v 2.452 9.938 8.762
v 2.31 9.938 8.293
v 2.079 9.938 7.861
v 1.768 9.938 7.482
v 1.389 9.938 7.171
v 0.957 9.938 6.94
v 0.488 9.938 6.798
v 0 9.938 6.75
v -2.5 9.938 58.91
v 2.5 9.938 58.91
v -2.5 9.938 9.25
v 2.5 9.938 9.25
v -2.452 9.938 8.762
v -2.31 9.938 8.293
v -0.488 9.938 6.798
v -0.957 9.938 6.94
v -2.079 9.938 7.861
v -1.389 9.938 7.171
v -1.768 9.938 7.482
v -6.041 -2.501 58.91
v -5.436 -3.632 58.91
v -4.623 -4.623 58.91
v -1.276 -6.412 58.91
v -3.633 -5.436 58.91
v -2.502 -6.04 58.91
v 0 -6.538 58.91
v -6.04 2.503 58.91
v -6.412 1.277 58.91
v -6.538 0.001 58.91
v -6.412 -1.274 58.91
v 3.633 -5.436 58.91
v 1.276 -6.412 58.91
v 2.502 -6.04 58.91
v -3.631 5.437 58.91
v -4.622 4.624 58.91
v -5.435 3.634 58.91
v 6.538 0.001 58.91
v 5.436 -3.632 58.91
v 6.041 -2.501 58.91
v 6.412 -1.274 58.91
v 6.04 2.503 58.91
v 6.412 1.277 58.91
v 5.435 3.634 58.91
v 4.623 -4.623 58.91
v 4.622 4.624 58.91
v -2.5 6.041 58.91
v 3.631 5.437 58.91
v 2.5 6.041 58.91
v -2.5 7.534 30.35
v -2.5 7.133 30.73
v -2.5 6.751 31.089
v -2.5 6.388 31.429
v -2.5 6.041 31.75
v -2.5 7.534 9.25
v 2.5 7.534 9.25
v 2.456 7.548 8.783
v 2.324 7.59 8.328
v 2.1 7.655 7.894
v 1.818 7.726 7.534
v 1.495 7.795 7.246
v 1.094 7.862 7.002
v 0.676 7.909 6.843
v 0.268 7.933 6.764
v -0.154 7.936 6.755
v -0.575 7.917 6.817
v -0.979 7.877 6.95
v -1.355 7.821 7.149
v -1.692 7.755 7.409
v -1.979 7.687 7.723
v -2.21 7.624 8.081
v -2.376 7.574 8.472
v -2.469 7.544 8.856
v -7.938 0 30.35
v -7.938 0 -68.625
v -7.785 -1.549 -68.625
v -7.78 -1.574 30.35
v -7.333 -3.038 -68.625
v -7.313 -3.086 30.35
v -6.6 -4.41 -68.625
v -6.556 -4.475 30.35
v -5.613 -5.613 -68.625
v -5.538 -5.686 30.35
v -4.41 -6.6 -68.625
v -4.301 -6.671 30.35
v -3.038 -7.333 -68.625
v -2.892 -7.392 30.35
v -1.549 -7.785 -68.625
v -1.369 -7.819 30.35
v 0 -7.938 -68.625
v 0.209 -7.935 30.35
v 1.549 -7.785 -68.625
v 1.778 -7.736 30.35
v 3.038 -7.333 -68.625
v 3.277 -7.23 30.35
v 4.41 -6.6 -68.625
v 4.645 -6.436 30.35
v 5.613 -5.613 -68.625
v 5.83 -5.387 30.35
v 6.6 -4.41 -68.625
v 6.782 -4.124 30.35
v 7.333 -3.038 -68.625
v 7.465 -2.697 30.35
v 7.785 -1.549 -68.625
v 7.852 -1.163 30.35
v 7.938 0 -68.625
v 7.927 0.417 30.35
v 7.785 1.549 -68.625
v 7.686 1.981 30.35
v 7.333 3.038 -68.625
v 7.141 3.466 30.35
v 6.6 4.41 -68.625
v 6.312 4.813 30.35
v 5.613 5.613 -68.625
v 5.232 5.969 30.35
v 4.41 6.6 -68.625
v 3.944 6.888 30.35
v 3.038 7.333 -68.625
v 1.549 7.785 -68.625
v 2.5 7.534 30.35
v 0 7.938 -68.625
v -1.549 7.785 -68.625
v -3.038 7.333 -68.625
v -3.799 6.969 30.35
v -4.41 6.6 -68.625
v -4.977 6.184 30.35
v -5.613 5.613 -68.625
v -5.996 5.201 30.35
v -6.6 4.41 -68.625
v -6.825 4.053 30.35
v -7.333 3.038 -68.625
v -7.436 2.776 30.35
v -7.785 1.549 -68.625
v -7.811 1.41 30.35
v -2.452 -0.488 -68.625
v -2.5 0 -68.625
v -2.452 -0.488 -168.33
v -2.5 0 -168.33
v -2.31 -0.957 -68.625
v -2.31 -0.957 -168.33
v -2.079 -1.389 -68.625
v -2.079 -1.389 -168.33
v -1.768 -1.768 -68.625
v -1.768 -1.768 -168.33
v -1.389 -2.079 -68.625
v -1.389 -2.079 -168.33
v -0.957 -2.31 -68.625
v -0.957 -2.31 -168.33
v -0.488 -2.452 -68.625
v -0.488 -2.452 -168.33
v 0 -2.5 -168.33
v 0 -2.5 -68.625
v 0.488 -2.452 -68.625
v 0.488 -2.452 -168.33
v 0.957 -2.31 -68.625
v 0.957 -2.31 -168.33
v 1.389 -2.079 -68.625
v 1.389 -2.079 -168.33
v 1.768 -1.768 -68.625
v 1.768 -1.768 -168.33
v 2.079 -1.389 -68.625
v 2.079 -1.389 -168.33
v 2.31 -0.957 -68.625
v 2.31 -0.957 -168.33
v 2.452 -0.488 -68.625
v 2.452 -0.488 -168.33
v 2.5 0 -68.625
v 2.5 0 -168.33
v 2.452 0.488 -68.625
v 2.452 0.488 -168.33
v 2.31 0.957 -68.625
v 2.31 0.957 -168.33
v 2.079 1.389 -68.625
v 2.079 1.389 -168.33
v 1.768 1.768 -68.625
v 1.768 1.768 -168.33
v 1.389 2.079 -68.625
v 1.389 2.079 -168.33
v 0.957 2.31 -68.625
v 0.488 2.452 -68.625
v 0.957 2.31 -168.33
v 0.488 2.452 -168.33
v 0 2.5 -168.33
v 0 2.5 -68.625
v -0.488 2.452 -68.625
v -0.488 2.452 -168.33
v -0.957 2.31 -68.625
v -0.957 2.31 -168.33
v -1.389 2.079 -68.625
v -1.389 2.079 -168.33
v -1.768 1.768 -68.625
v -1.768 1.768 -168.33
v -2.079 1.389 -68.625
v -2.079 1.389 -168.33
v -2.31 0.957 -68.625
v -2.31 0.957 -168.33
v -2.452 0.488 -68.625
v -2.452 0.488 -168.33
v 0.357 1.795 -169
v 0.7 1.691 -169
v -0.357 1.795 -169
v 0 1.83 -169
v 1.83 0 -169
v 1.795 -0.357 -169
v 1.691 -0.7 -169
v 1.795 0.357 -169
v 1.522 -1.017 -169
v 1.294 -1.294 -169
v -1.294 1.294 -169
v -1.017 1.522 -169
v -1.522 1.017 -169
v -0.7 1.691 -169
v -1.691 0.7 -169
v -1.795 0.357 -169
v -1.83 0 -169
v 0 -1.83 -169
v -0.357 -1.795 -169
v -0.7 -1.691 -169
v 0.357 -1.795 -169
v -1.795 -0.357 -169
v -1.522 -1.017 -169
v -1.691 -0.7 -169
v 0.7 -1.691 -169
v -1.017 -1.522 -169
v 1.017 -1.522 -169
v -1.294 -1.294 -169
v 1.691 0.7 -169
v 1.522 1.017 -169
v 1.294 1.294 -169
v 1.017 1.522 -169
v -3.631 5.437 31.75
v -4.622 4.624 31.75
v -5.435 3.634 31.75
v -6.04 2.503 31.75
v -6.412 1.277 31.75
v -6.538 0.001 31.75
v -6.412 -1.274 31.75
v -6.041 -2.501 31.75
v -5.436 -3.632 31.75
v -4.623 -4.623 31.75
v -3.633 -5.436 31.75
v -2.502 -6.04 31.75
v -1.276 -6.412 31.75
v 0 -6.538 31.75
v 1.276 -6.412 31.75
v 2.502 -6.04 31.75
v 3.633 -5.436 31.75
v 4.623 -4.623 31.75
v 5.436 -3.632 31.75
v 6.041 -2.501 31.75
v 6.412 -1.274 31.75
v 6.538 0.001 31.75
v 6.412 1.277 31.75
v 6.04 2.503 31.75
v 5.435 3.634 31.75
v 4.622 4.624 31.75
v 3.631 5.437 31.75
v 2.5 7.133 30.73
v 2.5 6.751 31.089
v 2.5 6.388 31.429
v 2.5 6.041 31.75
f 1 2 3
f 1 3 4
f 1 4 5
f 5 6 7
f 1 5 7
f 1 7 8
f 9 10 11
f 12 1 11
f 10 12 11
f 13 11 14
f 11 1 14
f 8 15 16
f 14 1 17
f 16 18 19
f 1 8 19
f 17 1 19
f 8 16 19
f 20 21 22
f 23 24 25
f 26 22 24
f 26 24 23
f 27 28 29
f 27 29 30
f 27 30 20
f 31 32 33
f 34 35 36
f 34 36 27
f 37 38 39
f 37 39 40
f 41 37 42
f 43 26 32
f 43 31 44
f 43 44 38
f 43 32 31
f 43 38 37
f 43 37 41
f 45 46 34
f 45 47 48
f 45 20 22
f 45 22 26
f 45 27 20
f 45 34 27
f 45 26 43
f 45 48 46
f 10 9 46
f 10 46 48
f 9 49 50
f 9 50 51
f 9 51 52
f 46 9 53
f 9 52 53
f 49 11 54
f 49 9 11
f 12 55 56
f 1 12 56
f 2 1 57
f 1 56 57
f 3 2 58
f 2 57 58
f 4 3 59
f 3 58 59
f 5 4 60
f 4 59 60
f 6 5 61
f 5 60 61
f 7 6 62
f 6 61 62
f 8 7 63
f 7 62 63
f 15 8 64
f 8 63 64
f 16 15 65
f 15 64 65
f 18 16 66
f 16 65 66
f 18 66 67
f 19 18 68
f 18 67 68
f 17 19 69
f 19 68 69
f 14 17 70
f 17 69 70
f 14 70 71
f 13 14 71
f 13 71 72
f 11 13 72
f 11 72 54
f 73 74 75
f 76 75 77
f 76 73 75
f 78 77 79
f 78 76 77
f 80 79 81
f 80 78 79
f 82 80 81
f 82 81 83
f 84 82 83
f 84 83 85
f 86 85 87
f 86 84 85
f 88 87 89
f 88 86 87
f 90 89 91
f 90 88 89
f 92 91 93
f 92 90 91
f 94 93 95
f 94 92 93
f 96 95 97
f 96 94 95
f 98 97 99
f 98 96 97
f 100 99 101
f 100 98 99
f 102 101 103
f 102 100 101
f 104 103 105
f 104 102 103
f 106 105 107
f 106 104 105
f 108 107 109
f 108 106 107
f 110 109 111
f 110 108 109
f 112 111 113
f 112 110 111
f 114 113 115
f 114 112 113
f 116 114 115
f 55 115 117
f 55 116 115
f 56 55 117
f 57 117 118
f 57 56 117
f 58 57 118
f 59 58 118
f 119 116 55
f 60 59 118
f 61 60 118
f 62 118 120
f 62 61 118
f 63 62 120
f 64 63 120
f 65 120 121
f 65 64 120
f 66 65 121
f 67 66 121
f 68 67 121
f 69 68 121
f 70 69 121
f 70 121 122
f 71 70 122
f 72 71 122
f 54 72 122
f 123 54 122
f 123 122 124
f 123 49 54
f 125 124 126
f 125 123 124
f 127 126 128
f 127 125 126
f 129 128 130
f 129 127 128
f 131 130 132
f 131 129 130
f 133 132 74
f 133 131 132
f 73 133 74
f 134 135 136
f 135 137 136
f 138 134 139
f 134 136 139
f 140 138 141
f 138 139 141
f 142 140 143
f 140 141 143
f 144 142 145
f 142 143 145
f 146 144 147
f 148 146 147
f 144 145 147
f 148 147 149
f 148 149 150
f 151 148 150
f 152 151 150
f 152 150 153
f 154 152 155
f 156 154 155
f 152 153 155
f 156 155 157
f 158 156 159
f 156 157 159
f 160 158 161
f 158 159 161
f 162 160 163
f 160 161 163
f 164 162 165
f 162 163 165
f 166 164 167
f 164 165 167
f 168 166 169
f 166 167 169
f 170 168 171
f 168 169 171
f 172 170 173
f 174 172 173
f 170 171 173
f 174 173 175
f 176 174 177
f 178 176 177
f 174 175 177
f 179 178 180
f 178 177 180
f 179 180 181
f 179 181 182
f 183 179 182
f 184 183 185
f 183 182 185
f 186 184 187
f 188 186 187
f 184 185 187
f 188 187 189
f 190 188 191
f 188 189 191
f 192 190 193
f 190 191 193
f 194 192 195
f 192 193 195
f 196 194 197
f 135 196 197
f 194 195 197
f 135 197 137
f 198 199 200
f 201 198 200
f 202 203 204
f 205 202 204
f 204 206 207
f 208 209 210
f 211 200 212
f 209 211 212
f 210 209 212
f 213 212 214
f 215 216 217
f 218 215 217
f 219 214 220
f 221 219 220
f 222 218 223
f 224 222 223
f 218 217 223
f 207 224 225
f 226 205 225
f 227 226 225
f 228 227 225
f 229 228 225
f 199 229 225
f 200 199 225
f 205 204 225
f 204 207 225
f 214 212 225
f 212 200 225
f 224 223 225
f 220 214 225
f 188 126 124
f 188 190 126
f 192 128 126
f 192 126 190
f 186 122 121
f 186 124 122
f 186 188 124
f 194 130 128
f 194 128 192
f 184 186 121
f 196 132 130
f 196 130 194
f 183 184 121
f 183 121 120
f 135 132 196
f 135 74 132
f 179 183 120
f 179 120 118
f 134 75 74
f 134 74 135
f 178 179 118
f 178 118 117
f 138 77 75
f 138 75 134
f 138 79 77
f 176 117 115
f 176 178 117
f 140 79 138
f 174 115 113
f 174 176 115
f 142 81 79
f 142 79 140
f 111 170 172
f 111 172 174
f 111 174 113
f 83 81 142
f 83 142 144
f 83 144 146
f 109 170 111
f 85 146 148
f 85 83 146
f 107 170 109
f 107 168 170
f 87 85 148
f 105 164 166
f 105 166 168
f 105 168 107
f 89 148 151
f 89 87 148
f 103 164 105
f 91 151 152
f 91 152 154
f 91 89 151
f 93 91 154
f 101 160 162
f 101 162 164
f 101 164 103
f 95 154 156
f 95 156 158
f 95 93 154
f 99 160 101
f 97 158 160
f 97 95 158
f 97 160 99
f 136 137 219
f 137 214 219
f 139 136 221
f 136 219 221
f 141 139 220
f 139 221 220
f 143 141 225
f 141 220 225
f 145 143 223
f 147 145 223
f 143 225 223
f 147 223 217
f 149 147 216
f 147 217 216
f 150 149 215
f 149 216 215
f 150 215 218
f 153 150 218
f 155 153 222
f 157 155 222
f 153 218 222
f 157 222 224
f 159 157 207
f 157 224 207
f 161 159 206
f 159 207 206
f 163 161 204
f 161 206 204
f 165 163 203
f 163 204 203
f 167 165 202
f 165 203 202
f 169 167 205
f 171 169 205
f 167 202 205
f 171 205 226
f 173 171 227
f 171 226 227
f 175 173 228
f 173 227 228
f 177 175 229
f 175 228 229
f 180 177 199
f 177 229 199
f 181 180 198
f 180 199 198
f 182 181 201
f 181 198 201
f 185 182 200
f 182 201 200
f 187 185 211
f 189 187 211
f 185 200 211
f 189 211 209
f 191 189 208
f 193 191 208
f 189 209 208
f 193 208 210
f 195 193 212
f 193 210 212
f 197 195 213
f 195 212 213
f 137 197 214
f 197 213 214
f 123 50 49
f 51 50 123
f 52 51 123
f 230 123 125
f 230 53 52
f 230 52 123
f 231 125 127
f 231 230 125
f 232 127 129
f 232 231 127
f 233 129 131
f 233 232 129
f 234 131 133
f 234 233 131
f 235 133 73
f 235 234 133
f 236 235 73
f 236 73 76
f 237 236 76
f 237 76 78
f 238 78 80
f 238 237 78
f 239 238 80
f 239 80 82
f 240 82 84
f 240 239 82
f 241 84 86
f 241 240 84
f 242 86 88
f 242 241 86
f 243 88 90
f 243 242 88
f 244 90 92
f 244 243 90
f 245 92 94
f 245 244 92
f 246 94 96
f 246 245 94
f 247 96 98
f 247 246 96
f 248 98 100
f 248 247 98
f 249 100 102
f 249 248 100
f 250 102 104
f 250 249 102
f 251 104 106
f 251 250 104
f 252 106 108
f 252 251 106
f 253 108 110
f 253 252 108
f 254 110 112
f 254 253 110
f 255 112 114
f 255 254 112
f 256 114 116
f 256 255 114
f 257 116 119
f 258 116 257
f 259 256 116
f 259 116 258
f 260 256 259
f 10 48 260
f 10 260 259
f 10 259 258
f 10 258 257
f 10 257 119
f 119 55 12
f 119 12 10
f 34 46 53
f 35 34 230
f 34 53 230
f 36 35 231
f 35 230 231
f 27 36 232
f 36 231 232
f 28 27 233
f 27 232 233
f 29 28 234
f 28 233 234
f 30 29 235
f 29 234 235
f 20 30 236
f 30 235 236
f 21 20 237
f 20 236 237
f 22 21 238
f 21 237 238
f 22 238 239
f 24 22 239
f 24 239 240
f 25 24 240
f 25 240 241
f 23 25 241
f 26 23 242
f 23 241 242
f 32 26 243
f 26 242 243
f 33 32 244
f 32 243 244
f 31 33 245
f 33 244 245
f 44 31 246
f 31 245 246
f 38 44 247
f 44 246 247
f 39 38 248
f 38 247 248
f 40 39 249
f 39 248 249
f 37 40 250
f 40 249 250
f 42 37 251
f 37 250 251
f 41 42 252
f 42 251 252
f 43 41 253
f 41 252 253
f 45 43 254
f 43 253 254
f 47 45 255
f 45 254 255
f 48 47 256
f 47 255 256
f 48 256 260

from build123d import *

# Parameters (mm, degrees)
BODY_KEY_DEPTH      = 9.9375
BOSS_EXTRUDE1_DEPTH = 27.16


with BuildPart() as part:
    # Sketch3 → Body (revolve)
    with BuildSketch(Plane(origin=(0, 0, 0), x_dir=(0, 0, -1), z_dir=(1, 0, 0)), mode=Mode.PRIVATE) as body_sk:
        Polygon((-31.75, 0), (68.625, 0), (68.625, 7.9375), (-30.350404591, 7.9375), (-31.75, 6.537904591), align=None)
    revolve(body_sk.sketch.rotate(Axis((0, 0, -80.9), (0, 0, 1)), 90), axis=Axis((0, 0, -80.9), (0, 0, 1)))

    # Sketch4 → Body-Back (revolve)
    with BuildSketch(Plane(origin=(0, 0, 0), x_dir=(0, 0, -1), z_dir=(1, 0, 0)), mode=Mode.PRIVATE) as body_back_sk:
        Polygon((68.625, 0), (68.625, 2.5), (168.330127019, 2.5), (169, 1.830127019), (169, 0), align=None)
    revolve(body_back_sk.sketch.rotate(Axis((0, 0, -80.9), (0, 0, 1)), 90), axis=Axis((0, 0, -80.9), (0, 0, 1)))

    # Sketch7 → Body-Key (add)
    with BuildSketch(Plane(origin=(0, 0, 0), x_dir=(1, 0, 0), z_dir=(0, 1, 0))):
        with BuildLine():
            Line((-2.5, -31.75), (2.5, -31.75))
            Line((2.5, -31.75), (2.5, -9.25))
            ThreePointArc((2.5, -9.25), (0, -6.75), (-2.5, -9.25))
            Line((-2.5, -9.25), (-2.5, -31.75))
        make_face()
    extrude(amount=BODY_KEY_DEPTH)

    # Sketch8 → Boss-Extrude1 (add)
    with BuildSketch(Plane.XY.offset(31.75)):
        with BuildLine():
            Line((2.5, 6.041042661), (2.5, 9.9375))
            Line((2.5, 9.9375), (-2.5, 9.9375))
            Line((-2.5, 9.9375), (-2.5, 6.041042661))
            ThreePointArc((-2.5, 6.041042661), (0, -6.537904591), (2.5, 6.041042661))
        make_face()
    extrude(amount=BOSS_EXTRUDE1_DEPTH)


solid = part.part
